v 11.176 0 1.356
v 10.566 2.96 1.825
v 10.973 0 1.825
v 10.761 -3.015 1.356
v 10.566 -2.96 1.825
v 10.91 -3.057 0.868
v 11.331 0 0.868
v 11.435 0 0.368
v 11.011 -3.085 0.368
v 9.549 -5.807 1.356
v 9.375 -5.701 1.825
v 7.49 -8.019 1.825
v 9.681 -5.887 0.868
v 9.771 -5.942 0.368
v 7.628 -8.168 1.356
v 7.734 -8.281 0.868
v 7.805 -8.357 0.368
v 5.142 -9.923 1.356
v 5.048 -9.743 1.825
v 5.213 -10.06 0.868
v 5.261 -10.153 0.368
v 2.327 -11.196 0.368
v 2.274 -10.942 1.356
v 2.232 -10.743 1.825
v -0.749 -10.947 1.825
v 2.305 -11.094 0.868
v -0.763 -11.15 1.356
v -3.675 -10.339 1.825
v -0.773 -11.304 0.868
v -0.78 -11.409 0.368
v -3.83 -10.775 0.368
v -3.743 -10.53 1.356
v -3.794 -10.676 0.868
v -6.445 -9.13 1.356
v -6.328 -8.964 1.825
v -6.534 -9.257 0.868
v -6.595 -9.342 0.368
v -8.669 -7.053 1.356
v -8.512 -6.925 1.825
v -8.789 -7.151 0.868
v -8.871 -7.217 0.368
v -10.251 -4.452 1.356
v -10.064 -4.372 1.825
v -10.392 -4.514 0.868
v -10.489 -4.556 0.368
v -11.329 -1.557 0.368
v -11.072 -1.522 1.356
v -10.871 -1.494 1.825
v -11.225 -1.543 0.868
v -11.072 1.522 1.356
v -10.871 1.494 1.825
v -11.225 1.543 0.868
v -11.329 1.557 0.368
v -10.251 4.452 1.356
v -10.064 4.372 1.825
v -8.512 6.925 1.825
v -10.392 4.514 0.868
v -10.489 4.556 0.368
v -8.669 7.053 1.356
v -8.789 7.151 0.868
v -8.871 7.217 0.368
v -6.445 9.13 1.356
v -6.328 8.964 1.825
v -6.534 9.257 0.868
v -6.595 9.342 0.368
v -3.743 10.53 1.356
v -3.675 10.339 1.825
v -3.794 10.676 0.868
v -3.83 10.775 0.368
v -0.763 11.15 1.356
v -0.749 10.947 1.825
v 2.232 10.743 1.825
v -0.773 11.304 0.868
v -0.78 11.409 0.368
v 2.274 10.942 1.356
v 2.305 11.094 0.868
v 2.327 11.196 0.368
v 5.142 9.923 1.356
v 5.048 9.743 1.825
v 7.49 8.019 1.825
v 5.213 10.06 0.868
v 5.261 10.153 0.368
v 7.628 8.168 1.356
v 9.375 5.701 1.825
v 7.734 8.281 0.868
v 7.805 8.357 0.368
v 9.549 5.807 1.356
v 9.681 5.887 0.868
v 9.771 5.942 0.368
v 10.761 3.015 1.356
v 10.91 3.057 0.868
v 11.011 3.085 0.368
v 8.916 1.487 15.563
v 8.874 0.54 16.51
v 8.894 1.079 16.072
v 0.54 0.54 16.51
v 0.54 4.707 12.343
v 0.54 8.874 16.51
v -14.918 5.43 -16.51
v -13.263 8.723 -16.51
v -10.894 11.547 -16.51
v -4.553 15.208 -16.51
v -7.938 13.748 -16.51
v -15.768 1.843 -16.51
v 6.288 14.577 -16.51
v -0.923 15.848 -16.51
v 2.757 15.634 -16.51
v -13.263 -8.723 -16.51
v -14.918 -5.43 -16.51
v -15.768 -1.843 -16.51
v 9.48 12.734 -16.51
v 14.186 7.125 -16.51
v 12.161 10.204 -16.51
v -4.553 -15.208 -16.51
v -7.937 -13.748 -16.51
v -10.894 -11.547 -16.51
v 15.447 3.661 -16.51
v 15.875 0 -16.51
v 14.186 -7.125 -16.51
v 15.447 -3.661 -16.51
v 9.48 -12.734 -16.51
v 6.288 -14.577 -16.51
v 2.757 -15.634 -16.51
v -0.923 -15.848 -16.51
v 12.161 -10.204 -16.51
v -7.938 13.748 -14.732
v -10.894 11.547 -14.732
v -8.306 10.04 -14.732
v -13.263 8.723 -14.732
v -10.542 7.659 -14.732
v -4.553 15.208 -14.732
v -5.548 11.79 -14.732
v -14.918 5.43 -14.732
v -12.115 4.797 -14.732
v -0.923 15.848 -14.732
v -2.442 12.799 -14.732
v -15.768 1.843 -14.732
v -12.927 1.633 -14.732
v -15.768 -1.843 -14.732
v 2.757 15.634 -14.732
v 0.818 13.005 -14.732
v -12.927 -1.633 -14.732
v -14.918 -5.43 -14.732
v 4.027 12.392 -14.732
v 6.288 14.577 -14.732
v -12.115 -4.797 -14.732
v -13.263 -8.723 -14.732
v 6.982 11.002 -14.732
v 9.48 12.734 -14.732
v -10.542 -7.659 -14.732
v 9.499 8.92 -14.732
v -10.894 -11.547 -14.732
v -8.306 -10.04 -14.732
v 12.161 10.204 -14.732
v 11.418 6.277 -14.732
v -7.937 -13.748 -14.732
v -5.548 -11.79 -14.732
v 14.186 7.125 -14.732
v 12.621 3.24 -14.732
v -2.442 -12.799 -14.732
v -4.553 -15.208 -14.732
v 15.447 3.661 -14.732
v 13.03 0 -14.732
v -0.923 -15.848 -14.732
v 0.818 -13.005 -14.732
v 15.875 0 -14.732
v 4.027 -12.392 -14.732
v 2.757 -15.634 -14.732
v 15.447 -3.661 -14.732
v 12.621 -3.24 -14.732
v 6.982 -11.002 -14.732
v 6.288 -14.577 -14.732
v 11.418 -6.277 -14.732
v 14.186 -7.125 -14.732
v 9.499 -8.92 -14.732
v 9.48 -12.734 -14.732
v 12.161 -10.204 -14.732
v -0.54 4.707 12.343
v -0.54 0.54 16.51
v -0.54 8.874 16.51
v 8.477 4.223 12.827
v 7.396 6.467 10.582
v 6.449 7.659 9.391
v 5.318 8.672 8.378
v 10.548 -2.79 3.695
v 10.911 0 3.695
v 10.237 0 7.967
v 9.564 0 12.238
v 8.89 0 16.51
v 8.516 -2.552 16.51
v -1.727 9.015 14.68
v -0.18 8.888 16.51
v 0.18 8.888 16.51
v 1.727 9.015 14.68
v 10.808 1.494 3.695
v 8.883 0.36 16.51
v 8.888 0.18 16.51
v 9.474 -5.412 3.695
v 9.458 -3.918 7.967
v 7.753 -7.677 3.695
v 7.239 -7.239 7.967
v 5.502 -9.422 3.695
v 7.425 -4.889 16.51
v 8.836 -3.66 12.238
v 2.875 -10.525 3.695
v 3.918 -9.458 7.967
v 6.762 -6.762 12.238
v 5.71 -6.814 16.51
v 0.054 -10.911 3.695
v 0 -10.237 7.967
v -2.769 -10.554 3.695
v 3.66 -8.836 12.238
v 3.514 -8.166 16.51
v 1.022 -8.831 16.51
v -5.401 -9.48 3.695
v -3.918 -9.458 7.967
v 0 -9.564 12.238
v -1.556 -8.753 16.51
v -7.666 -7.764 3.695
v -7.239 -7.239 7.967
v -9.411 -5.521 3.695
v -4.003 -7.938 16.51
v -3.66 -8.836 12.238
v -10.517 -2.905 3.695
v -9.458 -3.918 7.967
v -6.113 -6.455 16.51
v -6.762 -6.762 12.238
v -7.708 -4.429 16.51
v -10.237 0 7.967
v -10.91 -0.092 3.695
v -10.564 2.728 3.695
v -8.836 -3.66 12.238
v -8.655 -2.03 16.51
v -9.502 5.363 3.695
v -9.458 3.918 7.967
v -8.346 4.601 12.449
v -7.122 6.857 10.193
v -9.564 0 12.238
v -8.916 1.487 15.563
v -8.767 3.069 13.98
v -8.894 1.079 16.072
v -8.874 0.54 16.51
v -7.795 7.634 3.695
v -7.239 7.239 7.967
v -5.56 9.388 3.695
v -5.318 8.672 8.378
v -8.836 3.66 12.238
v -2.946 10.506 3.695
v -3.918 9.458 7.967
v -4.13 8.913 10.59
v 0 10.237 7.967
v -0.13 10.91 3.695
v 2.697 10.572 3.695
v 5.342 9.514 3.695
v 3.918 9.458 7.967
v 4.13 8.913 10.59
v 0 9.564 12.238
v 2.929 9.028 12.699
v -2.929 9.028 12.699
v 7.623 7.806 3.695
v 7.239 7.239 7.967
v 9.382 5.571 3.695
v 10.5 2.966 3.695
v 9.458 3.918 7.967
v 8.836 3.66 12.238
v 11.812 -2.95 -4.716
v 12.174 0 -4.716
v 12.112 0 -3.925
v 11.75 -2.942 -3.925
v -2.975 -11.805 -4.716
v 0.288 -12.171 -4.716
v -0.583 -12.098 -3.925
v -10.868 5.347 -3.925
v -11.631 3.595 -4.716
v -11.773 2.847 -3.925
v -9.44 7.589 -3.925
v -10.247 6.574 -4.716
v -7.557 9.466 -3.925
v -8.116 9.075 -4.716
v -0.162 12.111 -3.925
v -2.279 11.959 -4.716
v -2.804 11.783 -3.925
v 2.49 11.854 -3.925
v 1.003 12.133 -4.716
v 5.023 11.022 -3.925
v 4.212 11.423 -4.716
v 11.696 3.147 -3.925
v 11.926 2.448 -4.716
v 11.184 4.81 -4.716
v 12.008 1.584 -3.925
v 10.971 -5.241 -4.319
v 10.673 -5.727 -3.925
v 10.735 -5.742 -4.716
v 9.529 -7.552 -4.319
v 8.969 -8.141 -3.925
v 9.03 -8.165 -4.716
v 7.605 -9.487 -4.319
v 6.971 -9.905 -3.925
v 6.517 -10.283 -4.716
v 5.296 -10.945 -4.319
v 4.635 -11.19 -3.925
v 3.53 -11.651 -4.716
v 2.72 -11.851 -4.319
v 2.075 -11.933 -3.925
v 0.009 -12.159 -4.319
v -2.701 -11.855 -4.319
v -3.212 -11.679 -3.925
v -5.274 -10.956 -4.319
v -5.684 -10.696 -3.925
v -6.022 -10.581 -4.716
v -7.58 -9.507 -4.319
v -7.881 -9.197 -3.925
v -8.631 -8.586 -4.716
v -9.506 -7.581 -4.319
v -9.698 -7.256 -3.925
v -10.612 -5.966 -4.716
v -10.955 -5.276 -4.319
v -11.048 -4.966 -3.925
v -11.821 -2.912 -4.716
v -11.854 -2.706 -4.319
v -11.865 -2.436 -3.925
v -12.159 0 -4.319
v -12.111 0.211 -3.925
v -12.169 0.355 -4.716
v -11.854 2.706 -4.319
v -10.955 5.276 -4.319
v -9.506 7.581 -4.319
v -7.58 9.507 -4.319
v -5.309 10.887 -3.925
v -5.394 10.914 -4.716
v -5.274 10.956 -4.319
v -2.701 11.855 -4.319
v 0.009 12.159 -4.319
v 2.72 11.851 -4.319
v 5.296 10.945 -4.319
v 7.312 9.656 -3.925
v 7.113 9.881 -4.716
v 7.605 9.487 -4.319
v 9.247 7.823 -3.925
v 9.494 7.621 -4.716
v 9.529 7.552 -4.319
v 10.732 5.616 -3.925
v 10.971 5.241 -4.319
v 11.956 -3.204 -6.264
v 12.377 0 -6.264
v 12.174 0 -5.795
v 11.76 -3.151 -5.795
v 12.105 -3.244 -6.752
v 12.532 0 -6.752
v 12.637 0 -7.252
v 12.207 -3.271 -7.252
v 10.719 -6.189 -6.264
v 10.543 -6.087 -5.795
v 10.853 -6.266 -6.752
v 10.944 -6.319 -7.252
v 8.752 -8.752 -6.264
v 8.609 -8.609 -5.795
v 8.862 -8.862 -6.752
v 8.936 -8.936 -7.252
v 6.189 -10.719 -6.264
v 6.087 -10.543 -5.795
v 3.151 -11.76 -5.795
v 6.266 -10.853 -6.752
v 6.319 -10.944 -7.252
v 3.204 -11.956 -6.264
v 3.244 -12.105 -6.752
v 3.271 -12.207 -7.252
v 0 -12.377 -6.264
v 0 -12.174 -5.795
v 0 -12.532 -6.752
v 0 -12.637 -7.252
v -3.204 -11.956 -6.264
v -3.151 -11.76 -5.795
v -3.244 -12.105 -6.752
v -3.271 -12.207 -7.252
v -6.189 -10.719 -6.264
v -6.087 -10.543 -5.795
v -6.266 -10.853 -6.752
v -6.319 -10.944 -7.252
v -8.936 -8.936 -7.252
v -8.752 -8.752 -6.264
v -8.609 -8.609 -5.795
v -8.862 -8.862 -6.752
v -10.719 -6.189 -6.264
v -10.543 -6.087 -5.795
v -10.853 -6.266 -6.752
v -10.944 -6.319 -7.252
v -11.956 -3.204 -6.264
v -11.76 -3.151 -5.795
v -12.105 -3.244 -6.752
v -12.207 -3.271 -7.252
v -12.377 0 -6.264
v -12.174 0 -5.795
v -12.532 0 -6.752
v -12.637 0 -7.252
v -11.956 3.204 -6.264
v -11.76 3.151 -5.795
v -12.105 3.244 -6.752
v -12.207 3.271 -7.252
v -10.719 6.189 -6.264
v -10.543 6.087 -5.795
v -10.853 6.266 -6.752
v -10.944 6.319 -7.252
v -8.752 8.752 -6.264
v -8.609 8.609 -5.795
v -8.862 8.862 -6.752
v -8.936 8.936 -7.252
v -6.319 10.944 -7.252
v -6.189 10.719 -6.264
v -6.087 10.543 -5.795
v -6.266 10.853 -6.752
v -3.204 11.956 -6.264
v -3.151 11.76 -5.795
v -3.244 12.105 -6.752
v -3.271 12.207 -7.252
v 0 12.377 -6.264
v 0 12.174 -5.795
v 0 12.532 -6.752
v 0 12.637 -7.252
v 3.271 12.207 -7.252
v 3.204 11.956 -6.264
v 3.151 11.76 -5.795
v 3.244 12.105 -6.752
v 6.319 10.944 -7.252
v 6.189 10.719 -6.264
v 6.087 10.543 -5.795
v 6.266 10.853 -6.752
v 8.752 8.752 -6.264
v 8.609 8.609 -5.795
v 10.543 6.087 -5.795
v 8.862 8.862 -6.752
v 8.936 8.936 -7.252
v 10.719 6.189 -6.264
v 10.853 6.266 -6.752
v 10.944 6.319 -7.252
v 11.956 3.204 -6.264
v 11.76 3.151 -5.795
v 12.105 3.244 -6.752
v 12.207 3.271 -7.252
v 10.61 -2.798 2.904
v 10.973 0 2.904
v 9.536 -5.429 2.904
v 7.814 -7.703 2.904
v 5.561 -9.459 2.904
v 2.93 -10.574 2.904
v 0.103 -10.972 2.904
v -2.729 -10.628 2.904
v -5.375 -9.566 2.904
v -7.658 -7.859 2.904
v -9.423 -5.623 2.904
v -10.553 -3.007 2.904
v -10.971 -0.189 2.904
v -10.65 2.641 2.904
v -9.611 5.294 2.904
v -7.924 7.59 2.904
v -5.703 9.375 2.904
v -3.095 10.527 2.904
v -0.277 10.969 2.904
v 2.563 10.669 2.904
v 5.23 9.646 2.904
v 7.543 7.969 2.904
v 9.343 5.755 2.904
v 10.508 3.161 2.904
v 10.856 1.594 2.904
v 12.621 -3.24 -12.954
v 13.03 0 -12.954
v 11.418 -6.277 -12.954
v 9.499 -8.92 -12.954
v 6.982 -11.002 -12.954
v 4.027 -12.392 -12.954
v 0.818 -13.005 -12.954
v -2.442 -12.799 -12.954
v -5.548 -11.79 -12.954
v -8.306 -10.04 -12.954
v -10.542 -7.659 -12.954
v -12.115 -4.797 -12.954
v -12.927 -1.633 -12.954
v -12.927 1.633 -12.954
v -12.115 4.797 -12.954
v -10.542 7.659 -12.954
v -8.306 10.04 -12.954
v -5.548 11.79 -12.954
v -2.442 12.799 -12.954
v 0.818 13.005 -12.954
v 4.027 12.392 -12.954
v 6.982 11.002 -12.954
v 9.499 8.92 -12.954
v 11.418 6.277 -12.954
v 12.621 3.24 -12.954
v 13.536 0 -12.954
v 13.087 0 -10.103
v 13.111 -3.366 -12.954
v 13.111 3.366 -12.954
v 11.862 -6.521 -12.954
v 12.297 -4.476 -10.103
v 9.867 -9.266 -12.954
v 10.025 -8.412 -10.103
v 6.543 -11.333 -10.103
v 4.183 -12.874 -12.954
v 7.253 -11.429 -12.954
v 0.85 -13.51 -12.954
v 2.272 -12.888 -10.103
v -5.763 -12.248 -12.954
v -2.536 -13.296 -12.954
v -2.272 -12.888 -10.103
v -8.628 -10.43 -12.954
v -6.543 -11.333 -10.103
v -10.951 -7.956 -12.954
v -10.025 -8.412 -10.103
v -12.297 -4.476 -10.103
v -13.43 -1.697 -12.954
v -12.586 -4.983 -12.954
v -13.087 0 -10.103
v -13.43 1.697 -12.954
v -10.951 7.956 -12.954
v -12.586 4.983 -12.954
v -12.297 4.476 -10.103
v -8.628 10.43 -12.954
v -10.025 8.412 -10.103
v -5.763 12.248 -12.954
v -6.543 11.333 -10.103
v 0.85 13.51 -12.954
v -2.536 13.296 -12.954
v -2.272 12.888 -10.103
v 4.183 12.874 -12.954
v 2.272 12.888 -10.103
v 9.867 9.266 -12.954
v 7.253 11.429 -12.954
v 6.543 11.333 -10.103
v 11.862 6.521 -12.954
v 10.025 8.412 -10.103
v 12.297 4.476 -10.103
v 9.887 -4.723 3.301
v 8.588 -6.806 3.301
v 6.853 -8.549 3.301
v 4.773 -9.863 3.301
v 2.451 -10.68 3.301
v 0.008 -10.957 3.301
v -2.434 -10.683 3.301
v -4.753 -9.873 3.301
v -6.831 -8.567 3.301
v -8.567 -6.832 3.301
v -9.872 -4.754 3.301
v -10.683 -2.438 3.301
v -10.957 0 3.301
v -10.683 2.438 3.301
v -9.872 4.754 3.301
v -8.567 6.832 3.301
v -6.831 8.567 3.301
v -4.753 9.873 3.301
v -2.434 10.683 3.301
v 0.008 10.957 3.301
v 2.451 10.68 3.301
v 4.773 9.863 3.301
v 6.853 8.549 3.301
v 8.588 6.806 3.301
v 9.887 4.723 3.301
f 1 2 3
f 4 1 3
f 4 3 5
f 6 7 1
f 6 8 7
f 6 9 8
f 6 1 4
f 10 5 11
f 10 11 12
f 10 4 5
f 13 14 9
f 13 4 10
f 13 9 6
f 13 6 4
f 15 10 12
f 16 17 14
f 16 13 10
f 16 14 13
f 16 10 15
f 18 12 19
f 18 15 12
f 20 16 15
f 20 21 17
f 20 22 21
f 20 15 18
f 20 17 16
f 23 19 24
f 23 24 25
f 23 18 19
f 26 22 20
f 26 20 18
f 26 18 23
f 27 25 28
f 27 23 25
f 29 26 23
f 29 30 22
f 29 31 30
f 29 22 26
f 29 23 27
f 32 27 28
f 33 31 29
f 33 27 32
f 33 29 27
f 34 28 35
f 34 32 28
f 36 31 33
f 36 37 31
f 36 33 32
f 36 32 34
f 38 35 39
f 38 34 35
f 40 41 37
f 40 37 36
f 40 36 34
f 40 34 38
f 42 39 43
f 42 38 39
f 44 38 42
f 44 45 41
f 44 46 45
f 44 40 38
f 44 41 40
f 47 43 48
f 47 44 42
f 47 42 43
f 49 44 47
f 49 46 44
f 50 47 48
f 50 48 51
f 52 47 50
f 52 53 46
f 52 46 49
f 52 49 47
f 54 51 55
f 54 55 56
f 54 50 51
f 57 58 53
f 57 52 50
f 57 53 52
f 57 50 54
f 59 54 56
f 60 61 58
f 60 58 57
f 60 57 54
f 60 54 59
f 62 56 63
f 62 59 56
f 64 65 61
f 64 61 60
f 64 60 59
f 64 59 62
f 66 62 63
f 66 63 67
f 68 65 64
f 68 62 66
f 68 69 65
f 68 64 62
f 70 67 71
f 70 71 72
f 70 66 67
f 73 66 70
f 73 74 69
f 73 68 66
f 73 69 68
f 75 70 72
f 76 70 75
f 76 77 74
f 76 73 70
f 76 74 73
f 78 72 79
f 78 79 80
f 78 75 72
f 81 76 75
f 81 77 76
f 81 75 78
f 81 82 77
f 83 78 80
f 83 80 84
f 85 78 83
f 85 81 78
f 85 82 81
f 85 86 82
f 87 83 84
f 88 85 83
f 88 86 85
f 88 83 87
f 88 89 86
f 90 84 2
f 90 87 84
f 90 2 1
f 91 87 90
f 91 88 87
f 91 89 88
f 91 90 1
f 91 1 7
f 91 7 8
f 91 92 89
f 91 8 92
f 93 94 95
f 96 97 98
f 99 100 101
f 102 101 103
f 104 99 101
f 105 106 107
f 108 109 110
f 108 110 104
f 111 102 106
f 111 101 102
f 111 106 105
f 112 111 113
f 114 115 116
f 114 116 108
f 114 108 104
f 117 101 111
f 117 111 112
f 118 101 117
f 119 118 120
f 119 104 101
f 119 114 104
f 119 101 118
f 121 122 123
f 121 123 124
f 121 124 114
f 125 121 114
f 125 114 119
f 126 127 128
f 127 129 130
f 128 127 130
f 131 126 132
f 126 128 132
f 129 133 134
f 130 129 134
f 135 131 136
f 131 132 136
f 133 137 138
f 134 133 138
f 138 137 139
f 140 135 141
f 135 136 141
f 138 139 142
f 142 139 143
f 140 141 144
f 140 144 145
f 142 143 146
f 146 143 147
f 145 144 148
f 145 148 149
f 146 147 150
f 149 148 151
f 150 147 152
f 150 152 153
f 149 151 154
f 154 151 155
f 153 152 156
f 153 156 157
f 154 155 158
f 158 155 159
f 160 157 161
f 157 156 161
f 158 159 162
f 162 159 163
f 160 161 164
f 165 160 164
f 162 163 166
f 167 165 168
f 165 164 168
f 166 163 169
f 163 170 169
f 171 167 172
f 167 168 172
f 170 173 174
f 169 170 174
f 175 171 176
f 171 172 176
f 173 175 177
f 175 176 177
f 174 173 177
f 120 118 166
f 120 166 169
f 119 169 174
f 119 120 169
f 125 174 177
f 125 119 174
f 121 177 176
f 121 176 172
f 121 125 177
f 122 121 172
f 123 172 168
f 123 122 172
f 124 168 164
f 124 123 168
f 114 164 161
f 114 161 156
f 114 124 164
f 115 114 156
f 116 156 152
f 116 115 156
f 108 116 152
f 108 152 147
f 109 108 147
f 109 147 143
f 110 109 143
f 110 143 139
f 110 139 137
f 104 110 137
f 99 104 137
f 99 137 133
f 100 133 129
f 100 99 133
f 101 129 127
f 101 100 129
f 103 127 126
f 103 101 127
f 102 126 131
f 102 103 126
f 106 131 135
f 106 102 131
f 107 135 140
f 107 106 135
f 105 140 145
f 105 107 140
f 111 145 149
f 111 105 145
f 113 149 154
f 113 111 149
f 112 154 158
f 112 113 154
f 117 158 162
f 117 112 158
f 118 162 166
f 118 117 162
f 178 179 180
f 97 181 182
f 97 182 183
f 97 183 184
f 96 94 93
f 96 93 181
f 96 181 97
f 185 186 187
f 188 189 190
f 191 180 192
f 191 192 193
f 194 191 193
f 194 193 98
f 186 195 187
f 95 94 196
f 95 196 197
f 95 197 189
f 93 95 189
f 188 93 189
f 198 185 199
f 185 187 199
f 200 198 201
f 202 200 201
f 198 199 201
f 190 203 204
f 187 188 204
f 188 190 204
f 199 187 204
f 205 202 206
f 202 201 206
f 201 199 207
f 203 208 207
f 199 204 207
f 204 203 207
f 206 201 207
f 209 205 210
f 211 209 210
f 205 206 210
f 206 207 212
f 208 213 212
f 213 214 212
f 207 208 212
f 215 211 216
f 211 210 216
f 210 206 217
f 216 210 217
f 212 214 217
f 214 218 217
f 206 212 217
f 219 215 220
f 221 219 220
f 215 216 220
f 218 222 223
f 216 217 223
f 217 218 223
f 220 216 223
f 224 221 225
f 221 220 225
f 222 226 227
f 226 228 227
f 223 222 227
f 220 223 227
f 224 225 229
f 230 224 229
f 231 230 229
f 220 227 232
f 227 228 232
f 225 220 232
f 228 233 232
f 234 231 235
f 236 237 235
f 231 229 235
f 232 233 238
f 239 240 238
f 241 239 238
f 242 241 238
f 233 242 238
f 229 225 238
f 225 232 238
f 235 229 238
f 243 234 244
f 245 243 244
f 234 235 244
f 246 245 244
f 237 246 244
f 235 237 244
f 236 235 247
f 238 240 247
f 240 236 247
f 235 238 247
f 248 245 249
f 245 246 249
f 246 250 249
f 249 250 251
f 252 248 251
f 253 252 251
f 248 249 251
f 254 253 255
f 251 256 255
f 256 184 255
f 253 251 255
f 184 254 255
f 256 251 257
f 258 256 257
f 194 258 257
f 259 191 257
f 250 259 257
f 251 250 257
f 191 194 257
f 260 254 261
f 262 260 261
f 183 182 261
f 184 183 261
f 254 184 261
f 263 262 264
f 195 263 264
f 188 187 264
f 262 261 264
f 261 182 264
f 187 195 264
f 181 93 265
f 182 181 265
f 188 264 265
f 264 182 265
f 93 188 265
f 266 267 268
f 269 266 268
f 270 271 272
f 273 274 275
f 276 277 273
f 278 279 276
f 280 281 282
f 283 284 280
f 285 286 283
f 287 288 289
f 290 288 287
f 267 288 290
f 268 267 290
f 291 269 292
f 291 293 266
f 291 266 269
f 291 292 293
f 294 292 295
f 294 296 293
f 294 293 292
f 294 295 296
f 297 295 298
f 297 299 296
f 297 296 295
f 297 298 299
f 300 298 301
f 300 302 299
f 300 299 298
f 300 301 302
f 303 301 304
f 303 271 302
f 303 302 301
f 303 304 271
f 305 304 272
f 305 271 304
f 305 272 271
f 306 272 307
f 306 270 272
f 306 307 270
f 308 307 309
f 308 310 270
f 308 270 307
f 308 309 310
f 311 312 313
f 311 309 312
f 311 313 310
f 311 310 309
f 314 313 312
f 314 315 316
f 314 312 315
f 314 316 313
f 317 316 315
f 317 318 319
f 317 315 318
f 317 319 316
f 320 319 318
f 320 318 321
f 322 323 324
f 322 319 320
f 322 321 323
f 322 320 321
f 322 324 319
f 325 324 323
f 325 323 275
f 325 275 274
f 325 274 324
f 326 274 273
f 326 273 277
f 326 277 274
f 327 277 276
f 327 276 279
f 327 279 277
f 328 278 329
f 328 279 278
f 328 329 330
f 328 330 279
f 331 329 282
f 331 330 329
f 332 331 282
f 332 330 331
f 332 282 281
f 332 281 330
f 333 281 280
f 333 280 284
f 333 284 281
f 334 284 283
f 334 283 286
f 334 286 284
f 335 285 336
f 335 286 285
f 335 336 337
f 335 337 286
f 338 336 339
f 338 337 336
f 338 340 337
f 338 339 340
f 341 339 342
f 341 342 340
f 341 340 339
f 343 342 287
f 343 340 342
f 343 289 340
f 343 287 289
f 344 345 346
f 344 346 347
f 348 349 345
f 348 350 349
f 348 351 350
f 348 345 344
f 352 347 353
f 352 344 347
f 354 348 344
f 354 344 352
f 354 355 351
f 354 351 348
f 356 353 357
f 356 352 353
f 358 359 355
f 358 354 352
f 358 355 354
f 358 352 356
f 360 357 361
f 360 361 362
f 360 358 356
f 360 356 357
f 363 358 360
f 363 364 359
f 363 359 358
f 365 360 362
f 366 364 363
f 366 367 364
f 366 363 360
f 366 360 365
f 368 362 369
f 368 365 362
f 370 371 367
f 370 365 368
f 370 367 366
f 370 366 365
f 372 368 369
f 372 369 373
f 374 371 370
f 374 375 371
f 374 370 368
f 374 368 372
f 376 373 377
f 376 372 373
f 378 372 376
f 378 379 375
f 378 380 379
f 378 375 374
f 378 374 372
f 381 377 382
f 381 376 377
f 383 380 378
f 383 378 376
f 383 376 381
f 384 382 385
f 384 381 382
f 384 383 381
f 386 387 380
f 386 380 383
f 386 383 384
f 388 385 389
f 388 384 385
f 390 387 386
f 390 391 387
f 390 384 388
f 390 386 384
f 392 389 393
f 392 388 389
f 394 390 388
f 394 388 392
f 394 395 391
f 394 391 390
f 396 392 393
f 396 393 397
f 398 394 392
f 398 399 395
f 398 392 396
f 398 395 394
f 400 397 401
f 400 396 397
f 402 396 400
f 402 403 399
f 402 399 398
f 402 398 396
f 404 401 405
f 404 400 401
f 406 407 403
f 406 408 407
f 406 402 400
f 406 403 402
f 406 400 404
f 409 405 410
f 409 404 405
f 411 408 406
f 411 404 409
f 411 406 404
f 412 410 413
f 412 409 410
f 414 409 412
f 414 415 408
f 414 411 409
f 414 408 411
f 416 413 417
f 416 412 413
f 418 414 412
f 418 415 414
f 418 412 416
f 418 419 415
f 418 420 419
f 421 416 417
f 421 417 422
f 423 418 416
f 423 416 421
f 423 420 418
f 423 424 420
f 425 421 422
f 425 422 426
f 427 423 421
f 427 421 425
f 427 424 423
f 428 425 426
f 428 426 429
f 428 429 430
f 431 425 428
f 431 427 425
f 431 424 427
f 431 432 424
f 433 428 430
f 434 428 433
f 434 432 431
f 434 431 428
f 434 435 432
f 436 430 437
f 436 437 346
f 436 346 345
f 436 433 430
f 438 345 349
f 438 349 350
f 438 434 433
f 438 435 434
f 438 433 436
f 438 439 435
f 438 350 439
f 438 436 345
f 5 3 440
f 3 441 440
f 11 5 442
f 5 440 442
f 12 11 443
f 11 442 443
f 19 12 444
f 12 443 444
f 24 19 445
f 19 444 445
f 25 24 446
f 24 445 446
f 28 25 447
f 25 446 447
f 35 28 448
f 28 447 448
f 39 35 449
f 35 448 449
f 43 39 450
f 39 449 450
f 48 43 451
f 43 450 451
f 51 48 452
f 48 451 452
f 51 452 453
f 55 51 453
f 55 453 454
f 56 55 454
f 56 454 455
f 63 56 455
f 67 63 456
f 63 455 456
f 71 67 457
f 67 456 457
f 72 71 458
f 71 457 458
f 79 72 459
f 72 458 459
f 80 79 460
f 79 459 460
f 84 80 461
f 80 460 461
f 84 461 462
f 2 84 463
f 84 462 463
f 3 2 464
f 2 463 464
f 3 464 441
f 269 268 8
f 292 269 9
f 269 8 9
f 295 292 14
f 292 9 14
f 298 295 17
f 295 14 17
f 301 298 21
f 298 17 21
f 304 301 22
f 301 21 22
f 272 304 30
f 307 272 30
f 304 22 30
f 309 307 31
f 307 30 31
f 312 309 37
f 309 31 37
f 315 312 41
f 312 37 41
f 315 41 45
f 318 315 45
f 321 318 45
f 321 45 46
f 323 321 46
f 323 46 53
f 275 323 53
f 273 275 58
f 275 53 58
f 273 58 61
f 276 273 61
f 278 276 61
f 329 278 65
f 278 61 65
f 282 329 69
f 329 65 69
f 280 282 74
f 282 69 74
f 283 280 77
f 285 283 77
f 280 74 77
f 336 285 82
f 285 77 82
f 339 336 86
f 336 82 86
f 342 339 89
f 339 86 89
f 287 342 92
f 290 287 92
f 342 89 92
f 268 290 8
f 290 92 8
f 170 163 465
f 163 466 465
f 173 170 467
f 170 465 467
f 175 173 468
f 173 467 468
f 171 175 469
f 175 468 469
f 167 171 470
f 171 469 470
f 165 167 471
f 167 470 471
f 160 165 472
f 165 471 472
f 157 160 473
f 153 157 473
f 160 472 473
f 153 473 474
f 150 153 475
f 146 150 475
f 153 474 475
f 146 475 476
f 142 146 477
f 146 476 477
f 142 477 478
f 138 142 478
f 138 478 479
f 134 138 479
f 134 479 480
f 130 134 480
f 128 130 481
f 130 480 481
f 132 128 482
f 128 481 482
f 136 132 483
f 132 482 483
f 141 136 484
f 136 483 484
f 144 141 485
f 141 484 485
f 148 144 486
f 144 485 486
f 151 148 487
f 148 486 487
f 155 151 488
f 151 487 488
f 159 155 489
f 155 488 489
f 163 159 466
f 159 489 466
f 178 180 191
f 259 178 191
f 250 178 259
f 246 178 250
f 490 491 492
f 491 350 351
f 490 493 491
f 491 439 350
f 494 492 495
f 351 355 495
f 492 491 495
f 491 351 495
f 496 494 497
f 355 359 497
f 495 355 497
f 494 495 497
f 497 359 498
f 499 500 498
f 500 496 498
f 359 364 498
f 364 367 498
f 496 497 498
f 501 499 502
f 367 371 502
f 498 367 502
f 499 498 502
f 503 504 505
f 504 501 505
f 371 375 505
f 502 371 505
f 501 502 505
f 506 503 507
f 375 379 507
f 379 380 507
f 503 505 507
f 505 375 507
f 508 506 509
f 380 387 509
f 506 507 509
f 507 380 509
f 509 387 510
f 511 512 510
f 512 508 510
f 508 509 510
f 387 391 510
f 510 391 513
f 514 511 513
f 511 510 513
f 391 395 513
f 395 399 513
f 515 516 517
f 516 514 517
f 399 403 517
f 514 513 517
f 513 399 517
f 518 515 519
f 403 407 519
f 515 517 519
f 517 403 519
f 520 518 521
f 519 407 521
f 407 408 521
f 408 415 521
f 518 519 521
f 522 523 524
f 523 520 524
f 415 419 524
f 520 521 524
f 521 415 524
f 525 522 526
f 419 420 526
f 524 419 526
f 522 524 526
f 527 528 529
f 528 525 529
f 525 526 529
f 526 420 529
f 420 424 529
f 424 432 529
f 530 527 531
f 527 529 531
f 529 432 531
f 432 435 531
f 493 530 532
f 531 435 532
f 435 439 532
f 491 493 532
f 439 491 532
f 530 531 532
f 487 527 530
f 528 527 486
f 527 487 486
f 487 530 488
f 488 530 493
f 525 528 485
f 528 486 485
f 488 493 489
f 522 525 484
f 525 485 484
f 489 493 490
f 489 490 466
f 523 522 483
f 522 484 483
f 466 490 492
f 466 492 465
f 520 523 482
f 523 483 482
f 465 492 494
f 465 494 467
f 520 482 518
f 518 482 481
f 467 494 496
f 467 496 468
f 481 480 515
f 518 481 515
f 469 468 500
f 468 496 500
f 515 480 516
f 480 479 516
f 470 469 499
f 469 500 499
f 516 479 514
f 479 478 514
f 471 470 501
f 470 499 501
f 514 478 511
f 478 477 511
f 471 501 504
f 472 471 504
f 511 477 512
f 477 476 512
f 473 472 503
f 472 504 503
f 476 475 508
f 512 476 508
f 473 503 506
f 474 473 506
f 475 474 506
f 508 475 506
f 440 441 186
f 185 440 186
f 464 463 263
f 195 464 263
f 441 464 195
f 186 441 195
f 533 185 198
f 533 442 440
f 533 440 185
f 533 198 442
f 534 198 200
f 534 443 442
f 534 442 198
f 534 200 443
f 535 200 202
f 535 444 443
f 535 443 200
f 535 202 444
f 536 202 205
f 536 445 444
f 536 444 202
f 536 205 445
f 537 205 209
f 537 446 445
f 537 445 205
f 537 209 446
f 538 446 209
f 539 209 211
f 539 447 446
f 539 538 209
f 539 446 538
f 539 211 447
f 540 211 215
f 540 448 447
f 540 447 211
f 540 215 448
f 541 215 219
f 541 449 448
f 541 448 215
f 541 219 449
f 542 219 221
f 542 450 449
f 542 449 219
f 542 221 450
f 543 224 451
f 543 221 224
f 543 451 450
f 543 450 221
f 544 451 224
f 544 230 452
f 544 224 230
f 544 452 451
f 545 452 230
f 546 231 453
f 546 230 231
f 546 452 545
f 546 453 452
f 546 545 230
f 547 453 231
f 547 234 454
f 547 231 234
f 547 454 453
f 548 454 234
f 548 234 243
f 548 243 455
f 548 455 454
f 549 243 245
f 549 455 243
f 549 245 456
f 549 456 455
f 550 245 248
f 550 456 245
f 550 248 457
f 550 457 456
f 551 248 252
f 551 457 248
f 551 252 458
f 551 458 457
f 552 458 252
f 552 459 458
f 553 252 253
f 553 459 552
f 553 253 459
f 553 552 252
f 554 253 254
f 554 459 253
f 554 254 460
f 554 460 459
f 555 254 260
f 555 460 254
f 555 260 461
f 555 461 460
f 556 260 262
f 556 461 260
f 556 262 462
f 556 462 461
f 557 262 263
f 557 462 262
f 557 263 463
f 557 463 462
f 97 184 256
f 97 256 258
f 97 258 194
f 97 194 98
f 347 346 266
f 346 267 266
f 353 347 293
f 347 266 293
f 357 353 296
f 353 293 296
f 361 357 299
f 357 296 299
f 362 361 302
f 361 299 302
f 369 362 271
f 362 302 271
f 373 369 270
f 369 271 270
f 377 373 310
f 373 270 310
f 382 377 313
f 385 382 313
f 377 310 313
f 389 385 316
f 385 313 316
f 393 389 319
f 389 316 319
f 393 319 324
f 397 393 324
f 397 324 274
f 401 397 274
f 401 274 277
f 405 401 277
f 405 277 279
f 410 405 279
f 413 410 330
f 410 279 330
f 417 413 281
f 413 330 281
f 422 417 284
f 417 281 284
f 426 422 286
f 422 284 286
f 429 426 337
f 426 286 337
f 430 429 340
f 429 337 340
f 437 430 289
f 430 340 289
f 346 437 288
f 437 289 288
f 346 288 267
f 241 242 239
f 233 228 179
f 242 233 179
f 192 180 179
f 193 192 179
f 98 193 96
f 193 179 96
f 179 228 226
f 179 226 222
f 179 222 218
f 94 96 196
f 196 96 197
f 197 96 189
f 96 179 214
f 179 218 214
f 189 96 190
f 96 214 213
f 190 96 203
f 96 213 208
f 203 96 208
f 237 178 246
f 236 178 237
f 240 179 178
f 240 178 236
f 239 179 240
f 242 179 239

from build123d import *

# Parameters (mm, degrees)
F2_R      = 15.875
F3_DEPTH  = 1.778
F4_W      = 0.889
F4_H      = 1.778
F6_R      = 5.08
F12_DEPTH = 25.4


# Not quite as in the source:
# - a fillet or chamfer that OpenCascade refuses, or shapes differently, is made with other operations: its cross-section is extruded or revolved along the edge and cut away or added


with BuildPart() as f1:
    # F0 (on Front) → F1 (revolve)
    with BuildSketch(Plane.XZ):
        Polygon((8.89, 16.51), (0, 16.51), (0, 3.302), (10.9728, 3.302), align=None)
        Polygon((10.9728, 3.302), (0, 3.302), (0, 1.27), (11.2932307692, 1.27), (10.9728, 1.8250023726), align=None)
        Polygon((11.2932307692, 1.27), (0, 1.27), (0, -4.318), (12.1744153846, -4.318), align=None)
        Polygon((12.1744153846, -4.318), (0, -4.318), (0, -6.35), (12.4948461538, -6.35), (12.1744153846, -5.7949976274), align=None)
        Polygon((12.4948461538, -6.35), (0, -6.35), (0, -16.51), (14.097, -16.51), align=None)
    revolve(axis=Axis((0, 0, 0), (0, 0, -1)))

    # F2 (on face) → F3 (join)
    with BuildSketch(Plane(origin=(0, 0, -16.51), x_dir=(1, 0, 0), z_dir=(0, 0, -1))):
        Circle(F2_R)
    extrude(amount=-F3_DEPTH)

    # F4 (on Front) → F5 (revolve, cut)
    with BuildSketch(Plane.XZ):
        with Locations((13.4747296192, -13.843)):
            Rectangle(F4_W, F4_H)
    revolve(axis=Axis((0, 0, -8.2004386932), (0, 0, -1)), mode=Mode.SUBTRACT)

    # F6
    f6_edges = [f1.edges().sort_by_distance(p)[0] for p in [
        (-12.174415, 0, -4.318),
        (-10.9728, 0, 3.302),
    ]]
    fillet(f6_edges, radius=F6_R)

    # F7: fillet of radius 5.08 on 2 edges, made by hand

    # F7_s1 → F7_t2 (revolve, cut)
    with BuildSketch(Plane.XZ):
        with BuildLine():
            ThreePointArc((10.9728, 1.8250023726), (11.259283136, 1.1139138917), (11.4354988153, 0.367812391))
            Line((11.4354988153, 0.367812391), (11.2932307692, 1.27))
            Line((11.2932307692, 1.27), (10.9728, 1.8250023726))
        make_face()
    revolve(axis=Axis((0, 0, 1.27), (0, 0, -1)), mode=Mode.SUBTRACT)

    # F7_s3 → F7_t4 (revolve, cut)
    with BuildSketch(Plane.XZ):
        with BuildLine():
            ThreePointArc((12.1744153846, -5.7949976274), (12.4608985206, -6.5060861083), (12.6371141999, -7.252187609))
            Line((12.6371141999, -7.252187609), (12.4948461538, -6.35))
            Line((12.4948461538, -6.35), (12.1744153846, -5.7949976274))
        make_face()
    revolve(axis=Axis((0, 0, -6.35), (0, 0, -1)), mode=Mode.SUBTRACT)

    # F11 (on line) → F12 (cut)
    with BuildSketch(Plane(origin=(0, 8.524875, 8.524875), x_dir=(-1, 0, 0), z_dir=(0, 0.7071067812, 0.7071067812))):
        with BuildLine():
            Line((8.8735996043, 11.2926720722), (0.53975, 11.2926720722))
            Line((0.53975, 11.2926720722), (0.53975, 5.3997505037))
            Line((0.53975, 5.3997505037), (7.62, -2.9089047656))
            add(Edge.make_bspline(
                [(8.8735996043, 11.2926720722), (8.9393181622, 8.7279276849), (9.2979393658, 4.1523383564), (7.9516483041, -0.3346072044), (7.62, -2.9089047656)],
                knots=[0, 0, 0, 0, 0.4980817697, 1, 1, 1, 1], degree=3))
        make_face()
        with BuildLine():
            Line((-0.53975, 5.3997505037), (-0.53975, 11.2926720722))
            Line((-0.53975, 11.2926720722), (-8.8735996043, 11.2926720722))
            add(Edge.make_bspline(
                [(-8.8735996043, 11.2926720722), (-8.9393181622, 8.7279276849), (-9.2979393658, 4.1523383564), (-7.9516483041, -0.3346072044), (-7.62, -2.9089047656)],
                knots=[0, 0, 0, 0, 0.4980817697, 1, 1, 1, 1], degree=3))
            Line((-7.62, -2.9089047656), (-0.53975, 5.3997505037))
        make_face()
    extrude(amount=F12_DEPTH, mode=Mode.SUBTRACT)


solid = f1.part
